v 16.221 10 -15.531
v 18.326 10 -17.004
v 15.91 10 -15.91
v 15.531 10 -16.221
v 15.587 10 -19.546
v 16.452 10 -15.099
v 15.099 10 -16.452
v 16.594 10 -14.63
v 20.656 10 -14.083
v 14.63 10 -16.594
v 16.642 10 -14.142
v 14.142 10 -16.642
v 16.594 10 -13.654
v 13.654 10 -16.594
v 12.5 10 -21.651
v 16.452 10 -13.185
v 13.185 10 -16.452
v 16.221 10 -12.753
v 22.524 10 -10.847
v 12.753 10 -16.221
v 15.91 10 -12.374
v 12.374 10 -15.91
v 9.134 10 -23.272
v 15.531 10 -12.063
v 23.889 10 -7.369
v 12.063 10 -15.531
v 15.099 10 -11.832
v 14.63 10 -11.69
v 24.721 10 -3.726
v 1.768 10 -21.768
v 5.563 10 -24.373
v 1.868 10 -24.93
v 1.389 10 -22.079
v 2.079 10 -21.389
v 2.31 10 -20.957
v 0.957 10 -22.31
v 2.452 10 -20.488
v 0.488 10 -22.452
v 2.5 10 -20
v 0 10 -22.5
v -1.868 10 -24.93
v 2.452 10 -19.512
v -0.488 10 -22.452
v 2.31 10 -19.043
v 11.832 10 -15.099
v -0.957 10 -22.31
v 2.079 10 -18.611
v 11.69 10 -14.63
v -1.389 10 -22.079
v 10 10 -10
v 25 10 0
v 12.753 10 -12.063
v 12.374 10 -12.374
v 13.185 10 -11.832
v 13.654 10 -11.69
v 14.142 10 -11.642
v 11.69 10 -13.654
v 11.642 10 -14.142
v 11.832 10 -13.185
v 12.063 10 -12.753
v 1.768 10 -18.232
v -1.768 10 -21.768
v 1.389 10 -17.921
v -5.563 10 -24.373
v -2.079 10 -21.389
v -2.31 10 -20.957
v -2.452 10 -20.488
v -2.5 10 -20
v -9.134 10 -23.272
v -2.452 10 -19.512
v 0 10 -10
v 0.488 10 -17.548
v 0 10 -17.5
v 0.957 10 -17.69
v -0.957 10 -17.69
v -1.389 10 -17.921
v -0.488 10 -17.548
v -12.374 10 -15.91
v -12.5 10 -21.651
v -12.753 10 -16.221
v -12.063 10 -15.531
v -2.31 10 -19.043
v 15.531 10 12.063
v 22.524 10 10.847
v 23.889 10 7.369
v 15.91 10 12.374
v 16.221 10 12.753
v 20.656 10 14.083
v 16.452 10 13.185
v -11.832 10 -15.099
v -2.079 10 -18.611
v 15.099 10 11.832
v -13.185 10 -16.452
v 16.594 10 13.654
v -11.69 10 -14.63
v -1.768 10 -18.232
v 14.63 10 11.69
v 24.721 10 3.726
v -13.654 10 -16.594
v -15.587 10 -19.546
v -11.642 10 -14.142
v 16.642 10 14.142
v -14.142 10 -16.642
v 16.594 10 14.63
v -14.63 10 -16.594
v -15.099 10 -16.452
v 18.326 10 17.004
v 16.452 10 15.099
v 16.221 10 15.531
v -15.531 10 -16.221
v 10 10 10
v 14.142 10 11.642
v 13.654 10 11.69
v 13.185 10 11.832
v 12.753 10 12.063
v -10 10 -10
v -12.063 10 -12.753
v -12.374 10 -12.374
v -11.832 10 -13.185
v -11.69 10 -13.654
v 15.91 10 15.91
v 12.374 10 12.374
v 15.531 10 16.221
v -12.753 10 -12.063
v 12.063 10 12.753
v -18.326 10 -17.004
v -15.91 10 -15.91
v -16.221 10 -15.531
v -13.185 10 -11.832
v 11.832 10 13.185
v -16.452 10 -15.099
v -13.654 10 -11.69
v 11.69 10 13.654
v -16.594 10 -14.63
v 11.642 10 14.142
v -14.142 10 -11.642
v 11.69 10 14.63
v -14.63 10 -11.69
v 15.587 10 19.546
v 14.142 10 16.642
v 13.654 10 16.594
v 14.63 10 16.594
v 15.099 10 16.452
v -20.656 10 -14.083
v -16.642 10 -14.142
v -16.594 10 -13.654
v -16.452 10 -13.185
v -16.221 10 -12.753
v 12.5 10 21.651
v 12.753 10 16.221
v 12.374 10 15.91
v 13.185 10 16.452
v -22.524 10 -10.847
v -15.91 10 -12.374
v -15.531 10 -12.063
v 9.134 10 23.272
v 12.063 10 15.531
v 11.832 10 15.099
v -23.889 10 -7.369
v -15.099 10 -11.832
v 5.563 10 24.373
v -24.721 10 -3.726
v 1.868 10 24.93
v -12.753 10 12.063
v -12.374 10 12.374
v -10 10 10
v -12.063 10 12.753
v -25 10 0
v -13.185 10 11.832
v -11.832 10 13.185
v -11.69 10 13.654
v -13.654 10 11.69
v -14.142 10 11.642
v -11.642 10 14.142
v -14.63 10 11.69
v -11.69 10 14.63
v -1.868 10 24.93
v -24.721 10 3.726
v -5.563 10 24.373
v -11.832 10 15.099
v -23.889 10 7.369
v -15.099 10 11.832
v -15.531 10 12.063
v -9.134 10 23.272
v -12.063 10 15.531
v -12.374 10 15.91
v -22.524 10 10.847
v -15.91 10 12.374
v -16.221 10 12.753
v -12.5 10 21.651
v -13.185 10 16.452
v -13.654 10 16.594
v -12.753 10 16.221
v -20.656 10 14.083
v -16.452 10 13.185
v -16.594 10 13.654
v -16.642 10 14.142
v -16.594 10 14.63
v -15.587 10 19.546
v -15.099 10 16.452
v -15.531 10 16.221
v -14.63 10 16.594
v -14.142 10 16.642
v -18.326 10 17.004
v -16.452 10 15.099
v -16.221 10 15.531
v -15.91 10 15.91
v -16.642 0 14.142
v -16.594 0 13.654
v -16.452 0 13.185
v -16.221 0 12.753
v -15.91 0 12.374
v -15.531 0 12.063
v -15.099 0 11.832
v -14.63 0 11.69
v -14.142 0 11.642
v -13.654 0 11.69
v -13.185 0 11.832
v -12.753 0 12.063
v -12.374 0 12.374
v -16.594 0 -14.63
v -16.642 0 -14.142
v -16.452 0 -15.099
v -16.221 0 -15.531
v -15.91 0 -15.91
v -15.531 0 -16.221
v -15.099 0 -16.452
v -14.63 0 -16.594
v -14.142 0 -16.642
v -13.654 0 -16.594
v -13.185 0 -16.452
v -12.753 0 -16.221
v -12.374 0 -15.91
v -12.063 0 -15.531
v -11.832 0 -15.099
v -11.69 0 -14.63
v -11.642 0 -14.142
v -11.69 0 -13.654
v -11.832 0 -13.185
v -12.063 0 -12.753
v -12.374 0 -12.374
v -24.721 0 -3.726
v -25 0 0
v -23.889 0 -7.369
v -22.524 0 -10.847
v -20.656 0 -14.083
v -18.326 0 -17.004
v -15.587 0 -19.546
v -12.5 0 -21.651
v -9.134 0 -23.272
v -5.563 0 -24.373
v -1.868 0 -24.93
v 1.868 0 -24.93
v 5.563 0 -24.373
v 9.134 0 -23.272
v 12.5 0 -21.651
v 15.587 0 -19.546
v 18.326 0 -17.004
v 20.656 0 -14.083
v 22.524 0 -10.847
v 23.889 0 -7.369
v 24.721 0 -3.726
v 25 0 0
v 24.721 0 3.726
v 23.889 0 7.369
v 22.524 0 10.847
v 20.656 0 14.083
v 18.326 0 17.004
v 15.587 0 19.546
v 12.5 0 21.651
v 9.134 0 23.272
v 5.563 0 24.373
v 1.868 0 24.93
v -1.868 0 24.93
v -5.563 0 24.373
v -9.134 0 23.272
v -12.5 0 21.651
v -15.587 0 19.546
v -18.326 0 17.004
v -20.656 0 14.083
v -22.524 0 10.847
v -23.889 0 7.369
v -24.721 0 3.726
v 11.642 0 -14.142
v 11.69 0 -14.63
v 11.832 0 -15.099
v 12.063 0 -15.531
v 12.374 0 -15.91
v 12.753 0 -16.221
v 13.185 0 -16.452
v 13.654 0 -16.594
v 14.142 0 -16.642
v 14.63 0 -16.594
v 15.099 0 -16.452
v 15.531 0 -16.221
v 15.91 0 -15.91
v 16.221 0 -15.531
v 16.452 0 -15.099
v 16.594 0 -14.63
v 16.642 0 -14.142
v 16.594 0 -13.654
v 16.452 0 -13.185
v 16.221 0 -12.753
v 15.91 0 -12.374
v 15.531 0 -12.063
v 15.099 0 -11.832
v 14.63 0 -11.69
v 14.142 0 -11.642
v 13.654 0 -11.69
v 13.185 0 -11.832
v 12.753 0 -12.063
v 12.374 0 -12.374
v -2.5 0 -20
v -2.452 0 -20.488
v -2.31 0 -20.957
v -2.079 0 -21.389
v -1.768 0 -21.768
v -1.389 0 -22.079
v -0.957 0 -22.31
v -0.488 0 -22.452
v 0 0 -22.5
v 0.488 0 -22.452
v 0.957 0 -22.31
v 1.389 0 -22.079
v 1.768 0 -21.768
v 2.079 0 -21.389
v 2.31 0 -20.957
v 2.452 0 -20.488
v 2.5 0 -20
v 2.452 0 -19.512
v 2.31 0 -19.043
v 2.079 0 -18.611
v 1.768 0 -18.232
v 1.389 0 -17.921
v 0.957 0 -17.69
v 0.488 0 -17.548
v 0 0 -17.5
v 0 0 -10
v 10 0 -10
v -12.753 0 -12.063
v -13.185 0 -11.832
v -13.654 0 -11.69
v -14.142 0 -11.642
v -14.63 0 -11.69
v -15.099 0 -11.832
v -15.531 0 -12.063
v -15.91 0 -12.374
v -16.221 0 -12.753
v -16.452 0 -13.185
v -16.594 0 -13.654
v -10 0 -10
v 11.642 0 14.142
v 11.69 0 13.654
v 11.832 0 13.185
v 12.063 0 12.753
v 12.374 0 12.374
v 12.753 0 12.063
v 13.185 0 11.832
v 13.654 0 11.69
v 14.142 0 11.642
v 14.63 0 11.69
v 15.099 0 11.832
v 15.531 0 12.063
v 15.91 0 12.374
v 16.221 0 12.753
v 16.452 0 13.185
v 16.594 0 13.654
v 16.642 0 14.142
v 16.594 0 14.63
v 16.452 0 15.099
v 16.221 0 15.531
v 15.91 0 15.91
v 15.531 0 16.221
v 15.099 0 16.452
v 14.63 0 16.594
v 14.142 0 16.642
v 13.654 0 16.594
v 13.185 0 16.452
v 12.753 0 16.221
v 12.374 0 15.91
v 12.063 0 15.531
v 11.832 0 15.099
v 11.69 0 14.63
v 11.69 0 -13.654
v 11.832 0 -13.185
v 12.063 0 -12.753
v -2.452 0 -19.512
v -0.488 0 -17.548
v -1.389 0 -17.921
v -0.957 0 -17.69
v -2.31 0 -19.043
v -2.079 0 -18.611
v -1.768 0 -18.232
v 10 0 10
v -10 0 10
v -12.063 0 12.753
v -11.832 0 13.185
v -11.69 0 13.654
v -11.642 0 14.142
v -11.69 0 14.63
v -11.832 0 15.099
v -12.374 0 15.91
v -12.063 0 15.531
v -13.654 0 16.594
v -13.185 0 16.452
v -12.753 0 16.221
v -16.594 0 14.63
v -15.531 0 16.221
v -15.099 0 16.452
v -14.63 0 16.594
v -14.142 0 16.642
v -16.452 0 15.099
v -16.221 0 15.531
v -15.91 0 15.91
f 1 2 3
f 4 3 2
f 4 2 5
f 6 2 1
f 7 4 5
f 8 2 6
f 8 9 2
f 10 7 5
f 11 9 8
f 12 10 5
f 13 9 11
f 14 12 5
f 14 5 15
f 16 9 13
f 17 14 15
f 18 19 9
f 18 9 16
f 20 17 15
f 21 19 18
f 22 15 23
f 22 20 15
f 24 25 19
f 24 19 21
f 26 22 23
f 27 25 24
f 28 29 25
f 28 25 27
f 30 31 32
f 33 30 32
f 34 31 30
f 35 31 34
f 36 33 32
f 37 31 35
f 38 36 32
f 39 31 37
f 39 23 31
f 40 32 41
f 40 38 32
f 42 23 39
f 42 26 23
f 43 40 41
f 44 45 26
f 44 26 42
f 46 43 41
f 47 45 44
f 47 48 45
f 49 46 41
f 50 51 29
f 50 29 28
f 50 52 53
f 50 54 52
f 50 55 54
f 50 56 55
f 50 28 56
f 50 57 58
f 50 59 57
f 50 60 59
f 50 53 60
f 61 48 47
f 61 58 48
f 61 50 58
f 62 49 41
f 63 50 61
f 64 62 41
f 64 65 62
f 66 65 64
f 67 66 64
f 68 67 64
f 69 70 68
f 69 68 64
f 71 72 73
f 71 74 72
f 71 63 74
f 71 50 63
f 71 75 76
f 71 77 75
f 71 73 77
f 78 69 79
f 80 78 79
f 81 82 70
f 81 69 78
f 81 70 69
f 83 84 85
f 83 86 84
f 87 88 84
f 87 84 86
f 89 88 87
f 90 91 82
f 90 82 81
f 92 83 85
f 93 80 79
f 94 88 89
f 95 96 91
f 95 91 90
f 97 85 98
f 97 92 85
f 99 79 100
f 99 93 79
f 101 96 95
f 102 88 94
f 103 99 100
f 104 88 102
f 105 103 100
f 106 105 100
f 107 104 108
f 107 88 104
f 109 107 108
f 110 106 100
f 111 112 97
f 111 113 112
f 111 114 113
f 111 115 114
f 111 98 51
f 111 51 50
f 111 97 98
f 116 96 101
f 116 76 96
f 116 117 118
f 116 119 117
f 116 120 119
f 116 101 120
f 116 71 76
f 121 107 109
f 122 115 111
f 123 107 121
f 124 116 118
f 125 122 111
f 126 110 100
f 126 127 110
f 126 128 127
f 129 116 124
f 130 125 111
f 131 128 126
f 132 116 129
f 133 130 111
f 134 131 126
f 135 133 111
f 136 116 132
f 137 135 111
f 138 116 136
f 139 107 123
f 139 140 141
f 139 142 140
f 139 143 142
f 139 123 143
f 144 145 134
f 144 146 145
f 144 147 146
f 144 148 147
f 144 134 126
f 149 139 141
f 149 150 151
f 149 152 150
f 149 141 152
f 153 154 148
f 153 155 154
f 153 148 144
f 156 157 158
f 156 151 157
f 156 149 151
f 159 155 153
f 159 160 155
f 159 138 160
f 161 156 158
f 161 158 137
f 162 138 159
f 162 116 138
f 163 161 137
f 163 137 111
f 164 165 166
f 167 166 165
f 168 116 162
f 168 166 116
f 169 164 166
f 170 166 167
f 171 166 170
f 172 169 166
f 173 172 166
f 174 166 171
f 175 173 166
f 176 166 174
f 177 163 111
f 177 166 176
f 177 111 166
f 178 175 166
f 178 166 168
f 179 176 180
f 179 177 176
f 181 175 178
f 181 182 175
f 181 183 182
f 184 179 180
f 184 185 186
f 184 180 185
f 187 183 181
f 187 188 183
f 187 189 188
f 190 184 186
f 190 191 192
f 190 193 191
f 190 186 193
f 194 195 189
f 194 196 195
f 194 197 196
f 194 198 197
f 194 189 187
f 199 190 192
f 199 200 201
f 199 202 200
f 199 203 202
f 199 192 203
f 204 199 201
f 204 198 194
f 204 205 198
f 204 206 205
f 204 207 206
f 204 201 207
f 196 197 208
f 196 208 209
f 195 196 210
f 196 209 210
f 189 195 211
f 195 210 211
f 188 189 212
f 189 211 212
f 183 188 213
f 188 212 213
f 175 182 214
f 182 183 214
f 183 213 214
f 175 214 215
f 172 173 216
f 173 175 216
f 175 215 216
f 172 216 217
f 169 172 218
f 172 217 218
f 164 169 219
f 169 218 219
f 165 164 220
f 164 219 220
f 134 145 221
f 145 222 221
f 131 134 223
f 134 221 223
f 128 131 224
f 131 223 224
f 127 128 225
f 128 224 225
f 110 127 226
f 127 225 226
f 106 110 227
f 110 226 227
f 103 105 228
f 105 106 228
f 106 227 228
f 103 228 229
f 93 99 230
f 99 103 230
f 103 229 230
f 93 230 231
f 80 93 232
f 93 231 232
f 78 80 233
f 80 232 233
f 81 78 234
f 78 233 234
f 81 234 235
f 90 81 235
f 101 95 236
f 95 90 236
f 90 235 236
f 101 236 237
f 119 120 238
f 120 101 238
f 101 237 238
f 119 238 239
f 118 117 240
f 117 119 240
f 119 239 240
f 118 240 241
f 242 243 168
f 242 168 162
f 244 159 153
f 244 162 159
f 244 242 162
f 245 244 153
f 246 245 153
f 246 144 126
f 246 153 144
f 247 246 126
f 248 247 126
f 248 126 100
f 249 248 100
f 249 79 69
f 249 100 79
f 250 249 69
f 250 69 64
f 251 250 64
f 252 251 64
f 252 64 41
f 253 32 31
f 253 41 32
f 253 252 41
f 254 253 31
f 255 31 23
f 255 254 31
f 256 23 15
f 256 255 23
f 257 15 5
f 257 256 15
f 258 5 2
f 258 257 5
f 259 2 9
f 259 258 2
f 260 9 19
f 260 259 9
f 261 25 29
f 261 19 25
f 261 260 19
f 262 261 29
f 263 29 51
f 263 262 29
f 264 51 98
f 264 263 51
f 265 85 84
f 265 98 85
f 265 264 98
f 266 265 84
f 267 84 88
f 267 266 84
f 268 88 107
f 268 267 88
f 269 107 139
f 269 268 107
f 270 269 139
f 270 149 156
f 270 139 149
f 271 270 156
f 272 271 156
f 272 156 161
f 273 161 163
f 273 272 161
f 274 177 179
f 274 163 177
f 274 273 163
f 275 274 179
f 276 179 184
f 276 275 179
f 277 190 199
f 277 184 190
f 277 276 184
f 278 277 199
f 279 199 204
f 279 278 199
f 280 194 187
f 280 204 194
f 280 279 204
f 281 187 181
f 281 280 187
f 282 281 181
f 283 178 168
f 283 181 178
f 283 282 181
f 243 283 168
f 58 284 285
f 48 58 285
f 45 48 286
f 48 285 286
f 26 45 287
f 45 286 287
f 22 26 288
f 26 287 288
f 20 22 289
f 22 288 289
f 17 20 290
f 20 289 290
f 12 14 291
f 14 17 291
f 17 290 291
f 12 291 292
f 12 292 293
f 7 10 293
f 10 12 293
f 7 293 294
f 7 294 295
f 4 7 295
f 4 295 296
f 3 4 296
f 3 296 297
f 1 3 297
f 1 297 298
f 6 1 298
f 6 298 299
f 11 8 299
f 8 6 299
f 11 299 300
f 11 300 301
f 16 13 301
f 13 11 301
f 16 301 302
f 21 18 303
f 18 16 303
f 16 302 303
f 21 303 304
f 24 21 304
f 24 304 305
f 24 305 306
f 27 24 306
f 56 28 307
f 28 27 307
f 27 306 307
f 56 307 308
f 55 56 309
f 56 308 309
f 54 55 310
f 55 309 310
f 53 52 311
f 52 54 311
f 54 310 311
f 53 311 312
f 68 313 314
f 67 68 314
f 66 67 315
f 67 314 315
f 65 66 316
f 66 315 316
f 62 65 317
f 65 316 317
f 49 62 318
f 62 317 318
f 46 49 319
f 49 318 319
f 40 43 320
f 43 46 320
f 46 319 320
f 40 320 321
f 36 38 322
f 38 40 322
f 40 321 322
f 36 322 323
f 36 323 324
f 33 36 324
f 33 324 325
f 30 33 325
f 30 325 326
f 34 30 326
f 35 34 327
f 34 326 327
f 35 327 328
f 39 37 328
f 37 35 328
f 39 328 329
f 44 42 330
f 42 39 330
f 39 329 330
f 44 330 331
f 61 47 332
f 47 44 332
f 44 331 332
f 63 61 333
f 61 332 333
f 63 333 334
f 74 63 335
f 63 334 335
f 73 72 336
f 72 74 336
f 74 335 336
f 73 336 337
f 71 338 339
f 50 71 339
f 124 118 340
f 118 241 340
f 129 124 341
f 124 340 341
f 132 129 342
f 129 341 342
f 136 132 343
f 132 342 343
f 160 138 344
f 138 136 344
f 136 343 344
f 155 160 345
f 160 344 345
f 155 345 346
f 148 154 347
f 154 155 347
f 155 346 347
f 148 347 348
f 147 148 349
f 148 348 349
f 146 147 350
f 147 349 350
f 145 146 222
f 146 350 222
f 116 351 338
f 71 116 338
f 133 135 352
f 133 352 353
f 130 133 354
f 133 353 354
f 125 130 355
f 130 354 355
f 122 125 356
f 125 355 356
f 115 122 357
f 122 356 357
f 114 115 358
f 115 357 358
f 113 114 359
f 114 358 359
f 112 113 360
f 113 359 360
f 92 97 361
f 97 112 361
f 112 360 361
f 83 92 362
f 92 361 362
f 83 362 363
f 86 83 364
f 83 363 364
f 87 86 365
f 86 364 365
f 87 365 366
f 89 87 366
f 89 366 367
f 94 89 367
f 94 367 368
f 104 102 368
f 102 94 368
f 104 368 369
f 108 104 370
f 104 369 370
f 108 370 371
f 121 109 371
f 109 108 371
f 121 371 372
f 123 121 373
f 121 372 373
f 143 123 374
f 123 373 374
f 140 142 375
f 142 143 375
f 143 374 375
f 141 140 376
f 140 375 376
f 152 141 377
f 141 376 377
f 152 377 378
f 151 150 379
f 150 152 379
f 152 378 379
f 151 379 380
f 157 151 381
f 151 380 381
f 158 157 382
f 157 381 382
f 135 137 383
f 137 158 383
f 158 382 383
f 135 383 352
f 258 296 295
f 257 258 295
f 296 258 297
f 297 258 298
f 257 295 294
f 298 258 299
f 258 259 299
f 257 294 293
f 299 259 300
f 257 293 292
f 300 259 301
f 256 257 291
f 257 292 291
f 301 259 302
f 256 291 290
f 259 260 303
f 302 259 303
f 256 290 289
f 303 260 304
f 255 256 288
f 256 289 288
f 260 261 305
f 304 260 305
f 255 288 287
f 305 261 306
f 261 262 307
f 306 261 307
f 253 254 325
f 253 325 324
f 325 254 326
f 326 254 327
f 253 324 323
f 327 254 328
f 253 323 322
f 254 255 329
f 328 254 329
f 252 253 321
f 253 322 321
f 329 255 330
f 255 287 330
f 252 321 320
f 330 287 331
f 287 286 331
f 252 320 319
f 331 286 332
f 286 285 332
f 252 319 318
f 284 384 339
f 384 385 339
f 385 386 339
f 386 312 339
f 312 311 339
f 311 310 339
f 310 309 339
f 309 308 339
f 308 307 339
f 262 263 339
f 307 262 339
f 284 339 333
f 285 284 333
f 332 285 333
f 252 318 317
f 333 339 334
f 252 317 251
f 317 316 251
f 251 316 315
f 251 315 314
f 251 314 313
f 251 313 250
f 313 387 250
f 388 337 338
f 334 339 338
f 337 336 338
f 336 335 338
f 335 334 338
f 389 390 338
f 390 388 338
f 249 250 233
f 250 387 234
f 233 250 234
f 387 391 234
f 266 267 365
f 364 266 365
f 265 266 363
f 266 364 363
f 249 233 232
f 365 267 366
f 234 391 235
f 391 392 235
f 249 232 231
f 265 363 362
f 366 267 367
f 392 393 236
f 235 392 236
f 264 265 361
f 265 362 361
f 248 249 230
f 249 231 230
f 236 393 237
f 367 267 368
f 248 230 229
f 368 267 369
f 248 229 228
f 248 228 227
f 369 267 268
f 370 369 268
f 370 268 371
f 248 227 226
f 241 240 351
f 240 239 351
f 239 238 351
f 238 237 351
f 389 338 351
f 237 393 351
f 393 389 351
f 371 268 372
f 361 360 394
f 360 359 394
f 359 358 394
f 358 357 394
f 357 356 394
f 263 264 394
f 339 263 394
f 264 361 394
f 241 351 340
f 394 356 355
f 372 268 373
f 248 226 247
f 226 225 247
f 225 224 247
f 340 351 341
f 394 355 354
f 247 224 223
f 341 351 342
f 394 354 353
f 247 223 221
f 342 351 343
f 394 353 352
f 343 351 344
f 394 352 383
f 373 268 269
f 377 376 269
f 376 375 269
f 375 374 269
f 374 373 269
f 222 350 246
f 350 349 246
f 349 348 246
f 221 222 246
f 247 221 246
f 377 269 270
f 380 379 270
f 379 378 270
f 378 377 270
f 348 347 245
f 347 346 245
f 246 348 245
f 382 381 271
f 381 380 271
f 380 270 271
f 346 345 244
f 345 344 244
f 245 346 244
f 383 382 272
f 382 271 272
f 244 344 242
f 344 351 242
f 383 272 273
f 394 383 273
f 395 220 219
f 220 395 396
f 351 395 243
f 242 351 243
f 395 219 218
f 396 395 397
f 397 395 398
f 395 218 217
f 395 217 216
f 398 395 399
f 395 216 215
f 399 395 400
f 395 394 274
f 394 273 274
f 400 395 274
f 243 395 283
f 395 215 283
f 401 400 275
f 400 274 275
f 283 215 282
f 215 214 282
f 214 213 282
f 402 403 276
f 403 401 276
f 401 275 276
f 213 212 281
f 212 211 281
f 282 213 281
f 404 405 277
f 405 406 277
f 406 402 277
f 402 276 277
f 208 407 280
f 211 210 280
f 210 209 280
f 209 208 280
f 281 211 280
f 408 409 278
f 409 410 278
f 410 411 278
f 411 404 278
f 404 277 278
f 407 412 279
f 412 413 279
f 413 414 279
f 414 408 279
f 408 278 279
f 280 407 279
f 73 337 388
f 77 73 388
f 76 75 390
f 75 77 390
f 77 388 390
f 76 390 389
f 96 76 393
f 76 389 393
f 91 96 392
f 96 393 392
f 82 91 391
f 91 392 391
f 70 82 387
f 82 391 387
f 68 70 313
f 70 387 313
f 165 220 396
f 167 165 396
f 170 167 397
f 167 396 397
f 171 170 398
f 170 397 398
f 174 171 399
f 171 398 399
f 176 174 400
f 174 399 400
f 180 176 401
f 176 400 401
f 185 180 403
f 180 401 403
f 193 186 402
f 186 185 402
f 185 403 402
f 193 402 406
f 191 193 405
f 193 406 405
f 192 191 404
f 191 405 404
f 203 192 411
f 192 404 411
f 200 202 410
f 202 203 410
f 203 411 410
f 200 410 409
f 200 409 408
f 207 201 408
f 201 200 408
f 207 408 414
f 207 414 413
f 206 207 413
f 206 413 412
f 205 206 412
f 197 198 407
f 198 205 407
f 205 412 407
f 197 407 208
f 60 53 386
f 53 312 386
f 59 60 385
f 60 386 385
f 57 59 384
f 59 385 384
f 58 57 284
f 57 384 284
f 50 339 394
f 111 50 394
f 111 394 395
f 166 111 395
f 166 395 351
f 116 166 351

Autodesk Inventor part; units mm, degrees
ref_plane "YZ Plane" through (0, 0, 0) normal (1, 0, 0) x (0, 1, 0)
ref_plane "XZ Plane" through (0, 0, 0) normal (0, 1, 0) x (-1, 0, 0)
ref_plane "XY Plane" through (0, 0, 0) normal (0, 0, 1) x (1, 0, 0)
sketch "Sketch1" plane through (0, 0, 0) normal (0, 1, 0) x (-1, 0, 0)
  circle A0 centre (-14.1421, -14.1421) radius 2.5
  circle A1 centre (-14.1421, 14.1421) radius 2.5
  line L0 (0, 0) -> (-14.1421, 14.1421)
  line L1 (0, 0) -> (0, -20)
  line L2 (0, 0) -> (-14.1421, -14.1421)
  circle A2 centre (0, -20) radius 2.5
  circle A3 centre (0, 0) radius 25
  line L3 (0, 0) -> (14.1421, 14.1421)
  line L4 (0, 0) -> (14.1421, -14.1421)
  circle A4 centre (14.1421, 14.1421) radius 2.5
  circle A5 centre (14.1421, -14.1421) radius 2.5
  line L5 (-10, 10) -> (10, 10)
  line L6 (10, 10) -> (10, -10)
  line L7 (10, -10) -> (-10, -10)
  line L8 (-10, -10) -> (-10, 10)
  line L9 (-10, 10) -> (10, -10) construction
  line L10 (10, 10) -> (-10, -10) construction
  dimension "d0" = 20
  dimension "d1" = 20
  dimension "d2" = 135
  dimension "d3" = 5
  dimension "d4" = 5
  dimension "d5" = 20
  dimension "d6" = 90
  dimension "d7" = 5
  dimension "d8" = 20
  dimension "d9" = 90
  dimension "d10" = 5
  dimension "d11" = 20
  dimension "d12" = 90
  dimension "d13" = 5
  dimension "d14" = 20
  dimension "d15" = 20
extrude "Extrusion1" add sketch "Sketch1" along normal blind 10
properties part number "base"
